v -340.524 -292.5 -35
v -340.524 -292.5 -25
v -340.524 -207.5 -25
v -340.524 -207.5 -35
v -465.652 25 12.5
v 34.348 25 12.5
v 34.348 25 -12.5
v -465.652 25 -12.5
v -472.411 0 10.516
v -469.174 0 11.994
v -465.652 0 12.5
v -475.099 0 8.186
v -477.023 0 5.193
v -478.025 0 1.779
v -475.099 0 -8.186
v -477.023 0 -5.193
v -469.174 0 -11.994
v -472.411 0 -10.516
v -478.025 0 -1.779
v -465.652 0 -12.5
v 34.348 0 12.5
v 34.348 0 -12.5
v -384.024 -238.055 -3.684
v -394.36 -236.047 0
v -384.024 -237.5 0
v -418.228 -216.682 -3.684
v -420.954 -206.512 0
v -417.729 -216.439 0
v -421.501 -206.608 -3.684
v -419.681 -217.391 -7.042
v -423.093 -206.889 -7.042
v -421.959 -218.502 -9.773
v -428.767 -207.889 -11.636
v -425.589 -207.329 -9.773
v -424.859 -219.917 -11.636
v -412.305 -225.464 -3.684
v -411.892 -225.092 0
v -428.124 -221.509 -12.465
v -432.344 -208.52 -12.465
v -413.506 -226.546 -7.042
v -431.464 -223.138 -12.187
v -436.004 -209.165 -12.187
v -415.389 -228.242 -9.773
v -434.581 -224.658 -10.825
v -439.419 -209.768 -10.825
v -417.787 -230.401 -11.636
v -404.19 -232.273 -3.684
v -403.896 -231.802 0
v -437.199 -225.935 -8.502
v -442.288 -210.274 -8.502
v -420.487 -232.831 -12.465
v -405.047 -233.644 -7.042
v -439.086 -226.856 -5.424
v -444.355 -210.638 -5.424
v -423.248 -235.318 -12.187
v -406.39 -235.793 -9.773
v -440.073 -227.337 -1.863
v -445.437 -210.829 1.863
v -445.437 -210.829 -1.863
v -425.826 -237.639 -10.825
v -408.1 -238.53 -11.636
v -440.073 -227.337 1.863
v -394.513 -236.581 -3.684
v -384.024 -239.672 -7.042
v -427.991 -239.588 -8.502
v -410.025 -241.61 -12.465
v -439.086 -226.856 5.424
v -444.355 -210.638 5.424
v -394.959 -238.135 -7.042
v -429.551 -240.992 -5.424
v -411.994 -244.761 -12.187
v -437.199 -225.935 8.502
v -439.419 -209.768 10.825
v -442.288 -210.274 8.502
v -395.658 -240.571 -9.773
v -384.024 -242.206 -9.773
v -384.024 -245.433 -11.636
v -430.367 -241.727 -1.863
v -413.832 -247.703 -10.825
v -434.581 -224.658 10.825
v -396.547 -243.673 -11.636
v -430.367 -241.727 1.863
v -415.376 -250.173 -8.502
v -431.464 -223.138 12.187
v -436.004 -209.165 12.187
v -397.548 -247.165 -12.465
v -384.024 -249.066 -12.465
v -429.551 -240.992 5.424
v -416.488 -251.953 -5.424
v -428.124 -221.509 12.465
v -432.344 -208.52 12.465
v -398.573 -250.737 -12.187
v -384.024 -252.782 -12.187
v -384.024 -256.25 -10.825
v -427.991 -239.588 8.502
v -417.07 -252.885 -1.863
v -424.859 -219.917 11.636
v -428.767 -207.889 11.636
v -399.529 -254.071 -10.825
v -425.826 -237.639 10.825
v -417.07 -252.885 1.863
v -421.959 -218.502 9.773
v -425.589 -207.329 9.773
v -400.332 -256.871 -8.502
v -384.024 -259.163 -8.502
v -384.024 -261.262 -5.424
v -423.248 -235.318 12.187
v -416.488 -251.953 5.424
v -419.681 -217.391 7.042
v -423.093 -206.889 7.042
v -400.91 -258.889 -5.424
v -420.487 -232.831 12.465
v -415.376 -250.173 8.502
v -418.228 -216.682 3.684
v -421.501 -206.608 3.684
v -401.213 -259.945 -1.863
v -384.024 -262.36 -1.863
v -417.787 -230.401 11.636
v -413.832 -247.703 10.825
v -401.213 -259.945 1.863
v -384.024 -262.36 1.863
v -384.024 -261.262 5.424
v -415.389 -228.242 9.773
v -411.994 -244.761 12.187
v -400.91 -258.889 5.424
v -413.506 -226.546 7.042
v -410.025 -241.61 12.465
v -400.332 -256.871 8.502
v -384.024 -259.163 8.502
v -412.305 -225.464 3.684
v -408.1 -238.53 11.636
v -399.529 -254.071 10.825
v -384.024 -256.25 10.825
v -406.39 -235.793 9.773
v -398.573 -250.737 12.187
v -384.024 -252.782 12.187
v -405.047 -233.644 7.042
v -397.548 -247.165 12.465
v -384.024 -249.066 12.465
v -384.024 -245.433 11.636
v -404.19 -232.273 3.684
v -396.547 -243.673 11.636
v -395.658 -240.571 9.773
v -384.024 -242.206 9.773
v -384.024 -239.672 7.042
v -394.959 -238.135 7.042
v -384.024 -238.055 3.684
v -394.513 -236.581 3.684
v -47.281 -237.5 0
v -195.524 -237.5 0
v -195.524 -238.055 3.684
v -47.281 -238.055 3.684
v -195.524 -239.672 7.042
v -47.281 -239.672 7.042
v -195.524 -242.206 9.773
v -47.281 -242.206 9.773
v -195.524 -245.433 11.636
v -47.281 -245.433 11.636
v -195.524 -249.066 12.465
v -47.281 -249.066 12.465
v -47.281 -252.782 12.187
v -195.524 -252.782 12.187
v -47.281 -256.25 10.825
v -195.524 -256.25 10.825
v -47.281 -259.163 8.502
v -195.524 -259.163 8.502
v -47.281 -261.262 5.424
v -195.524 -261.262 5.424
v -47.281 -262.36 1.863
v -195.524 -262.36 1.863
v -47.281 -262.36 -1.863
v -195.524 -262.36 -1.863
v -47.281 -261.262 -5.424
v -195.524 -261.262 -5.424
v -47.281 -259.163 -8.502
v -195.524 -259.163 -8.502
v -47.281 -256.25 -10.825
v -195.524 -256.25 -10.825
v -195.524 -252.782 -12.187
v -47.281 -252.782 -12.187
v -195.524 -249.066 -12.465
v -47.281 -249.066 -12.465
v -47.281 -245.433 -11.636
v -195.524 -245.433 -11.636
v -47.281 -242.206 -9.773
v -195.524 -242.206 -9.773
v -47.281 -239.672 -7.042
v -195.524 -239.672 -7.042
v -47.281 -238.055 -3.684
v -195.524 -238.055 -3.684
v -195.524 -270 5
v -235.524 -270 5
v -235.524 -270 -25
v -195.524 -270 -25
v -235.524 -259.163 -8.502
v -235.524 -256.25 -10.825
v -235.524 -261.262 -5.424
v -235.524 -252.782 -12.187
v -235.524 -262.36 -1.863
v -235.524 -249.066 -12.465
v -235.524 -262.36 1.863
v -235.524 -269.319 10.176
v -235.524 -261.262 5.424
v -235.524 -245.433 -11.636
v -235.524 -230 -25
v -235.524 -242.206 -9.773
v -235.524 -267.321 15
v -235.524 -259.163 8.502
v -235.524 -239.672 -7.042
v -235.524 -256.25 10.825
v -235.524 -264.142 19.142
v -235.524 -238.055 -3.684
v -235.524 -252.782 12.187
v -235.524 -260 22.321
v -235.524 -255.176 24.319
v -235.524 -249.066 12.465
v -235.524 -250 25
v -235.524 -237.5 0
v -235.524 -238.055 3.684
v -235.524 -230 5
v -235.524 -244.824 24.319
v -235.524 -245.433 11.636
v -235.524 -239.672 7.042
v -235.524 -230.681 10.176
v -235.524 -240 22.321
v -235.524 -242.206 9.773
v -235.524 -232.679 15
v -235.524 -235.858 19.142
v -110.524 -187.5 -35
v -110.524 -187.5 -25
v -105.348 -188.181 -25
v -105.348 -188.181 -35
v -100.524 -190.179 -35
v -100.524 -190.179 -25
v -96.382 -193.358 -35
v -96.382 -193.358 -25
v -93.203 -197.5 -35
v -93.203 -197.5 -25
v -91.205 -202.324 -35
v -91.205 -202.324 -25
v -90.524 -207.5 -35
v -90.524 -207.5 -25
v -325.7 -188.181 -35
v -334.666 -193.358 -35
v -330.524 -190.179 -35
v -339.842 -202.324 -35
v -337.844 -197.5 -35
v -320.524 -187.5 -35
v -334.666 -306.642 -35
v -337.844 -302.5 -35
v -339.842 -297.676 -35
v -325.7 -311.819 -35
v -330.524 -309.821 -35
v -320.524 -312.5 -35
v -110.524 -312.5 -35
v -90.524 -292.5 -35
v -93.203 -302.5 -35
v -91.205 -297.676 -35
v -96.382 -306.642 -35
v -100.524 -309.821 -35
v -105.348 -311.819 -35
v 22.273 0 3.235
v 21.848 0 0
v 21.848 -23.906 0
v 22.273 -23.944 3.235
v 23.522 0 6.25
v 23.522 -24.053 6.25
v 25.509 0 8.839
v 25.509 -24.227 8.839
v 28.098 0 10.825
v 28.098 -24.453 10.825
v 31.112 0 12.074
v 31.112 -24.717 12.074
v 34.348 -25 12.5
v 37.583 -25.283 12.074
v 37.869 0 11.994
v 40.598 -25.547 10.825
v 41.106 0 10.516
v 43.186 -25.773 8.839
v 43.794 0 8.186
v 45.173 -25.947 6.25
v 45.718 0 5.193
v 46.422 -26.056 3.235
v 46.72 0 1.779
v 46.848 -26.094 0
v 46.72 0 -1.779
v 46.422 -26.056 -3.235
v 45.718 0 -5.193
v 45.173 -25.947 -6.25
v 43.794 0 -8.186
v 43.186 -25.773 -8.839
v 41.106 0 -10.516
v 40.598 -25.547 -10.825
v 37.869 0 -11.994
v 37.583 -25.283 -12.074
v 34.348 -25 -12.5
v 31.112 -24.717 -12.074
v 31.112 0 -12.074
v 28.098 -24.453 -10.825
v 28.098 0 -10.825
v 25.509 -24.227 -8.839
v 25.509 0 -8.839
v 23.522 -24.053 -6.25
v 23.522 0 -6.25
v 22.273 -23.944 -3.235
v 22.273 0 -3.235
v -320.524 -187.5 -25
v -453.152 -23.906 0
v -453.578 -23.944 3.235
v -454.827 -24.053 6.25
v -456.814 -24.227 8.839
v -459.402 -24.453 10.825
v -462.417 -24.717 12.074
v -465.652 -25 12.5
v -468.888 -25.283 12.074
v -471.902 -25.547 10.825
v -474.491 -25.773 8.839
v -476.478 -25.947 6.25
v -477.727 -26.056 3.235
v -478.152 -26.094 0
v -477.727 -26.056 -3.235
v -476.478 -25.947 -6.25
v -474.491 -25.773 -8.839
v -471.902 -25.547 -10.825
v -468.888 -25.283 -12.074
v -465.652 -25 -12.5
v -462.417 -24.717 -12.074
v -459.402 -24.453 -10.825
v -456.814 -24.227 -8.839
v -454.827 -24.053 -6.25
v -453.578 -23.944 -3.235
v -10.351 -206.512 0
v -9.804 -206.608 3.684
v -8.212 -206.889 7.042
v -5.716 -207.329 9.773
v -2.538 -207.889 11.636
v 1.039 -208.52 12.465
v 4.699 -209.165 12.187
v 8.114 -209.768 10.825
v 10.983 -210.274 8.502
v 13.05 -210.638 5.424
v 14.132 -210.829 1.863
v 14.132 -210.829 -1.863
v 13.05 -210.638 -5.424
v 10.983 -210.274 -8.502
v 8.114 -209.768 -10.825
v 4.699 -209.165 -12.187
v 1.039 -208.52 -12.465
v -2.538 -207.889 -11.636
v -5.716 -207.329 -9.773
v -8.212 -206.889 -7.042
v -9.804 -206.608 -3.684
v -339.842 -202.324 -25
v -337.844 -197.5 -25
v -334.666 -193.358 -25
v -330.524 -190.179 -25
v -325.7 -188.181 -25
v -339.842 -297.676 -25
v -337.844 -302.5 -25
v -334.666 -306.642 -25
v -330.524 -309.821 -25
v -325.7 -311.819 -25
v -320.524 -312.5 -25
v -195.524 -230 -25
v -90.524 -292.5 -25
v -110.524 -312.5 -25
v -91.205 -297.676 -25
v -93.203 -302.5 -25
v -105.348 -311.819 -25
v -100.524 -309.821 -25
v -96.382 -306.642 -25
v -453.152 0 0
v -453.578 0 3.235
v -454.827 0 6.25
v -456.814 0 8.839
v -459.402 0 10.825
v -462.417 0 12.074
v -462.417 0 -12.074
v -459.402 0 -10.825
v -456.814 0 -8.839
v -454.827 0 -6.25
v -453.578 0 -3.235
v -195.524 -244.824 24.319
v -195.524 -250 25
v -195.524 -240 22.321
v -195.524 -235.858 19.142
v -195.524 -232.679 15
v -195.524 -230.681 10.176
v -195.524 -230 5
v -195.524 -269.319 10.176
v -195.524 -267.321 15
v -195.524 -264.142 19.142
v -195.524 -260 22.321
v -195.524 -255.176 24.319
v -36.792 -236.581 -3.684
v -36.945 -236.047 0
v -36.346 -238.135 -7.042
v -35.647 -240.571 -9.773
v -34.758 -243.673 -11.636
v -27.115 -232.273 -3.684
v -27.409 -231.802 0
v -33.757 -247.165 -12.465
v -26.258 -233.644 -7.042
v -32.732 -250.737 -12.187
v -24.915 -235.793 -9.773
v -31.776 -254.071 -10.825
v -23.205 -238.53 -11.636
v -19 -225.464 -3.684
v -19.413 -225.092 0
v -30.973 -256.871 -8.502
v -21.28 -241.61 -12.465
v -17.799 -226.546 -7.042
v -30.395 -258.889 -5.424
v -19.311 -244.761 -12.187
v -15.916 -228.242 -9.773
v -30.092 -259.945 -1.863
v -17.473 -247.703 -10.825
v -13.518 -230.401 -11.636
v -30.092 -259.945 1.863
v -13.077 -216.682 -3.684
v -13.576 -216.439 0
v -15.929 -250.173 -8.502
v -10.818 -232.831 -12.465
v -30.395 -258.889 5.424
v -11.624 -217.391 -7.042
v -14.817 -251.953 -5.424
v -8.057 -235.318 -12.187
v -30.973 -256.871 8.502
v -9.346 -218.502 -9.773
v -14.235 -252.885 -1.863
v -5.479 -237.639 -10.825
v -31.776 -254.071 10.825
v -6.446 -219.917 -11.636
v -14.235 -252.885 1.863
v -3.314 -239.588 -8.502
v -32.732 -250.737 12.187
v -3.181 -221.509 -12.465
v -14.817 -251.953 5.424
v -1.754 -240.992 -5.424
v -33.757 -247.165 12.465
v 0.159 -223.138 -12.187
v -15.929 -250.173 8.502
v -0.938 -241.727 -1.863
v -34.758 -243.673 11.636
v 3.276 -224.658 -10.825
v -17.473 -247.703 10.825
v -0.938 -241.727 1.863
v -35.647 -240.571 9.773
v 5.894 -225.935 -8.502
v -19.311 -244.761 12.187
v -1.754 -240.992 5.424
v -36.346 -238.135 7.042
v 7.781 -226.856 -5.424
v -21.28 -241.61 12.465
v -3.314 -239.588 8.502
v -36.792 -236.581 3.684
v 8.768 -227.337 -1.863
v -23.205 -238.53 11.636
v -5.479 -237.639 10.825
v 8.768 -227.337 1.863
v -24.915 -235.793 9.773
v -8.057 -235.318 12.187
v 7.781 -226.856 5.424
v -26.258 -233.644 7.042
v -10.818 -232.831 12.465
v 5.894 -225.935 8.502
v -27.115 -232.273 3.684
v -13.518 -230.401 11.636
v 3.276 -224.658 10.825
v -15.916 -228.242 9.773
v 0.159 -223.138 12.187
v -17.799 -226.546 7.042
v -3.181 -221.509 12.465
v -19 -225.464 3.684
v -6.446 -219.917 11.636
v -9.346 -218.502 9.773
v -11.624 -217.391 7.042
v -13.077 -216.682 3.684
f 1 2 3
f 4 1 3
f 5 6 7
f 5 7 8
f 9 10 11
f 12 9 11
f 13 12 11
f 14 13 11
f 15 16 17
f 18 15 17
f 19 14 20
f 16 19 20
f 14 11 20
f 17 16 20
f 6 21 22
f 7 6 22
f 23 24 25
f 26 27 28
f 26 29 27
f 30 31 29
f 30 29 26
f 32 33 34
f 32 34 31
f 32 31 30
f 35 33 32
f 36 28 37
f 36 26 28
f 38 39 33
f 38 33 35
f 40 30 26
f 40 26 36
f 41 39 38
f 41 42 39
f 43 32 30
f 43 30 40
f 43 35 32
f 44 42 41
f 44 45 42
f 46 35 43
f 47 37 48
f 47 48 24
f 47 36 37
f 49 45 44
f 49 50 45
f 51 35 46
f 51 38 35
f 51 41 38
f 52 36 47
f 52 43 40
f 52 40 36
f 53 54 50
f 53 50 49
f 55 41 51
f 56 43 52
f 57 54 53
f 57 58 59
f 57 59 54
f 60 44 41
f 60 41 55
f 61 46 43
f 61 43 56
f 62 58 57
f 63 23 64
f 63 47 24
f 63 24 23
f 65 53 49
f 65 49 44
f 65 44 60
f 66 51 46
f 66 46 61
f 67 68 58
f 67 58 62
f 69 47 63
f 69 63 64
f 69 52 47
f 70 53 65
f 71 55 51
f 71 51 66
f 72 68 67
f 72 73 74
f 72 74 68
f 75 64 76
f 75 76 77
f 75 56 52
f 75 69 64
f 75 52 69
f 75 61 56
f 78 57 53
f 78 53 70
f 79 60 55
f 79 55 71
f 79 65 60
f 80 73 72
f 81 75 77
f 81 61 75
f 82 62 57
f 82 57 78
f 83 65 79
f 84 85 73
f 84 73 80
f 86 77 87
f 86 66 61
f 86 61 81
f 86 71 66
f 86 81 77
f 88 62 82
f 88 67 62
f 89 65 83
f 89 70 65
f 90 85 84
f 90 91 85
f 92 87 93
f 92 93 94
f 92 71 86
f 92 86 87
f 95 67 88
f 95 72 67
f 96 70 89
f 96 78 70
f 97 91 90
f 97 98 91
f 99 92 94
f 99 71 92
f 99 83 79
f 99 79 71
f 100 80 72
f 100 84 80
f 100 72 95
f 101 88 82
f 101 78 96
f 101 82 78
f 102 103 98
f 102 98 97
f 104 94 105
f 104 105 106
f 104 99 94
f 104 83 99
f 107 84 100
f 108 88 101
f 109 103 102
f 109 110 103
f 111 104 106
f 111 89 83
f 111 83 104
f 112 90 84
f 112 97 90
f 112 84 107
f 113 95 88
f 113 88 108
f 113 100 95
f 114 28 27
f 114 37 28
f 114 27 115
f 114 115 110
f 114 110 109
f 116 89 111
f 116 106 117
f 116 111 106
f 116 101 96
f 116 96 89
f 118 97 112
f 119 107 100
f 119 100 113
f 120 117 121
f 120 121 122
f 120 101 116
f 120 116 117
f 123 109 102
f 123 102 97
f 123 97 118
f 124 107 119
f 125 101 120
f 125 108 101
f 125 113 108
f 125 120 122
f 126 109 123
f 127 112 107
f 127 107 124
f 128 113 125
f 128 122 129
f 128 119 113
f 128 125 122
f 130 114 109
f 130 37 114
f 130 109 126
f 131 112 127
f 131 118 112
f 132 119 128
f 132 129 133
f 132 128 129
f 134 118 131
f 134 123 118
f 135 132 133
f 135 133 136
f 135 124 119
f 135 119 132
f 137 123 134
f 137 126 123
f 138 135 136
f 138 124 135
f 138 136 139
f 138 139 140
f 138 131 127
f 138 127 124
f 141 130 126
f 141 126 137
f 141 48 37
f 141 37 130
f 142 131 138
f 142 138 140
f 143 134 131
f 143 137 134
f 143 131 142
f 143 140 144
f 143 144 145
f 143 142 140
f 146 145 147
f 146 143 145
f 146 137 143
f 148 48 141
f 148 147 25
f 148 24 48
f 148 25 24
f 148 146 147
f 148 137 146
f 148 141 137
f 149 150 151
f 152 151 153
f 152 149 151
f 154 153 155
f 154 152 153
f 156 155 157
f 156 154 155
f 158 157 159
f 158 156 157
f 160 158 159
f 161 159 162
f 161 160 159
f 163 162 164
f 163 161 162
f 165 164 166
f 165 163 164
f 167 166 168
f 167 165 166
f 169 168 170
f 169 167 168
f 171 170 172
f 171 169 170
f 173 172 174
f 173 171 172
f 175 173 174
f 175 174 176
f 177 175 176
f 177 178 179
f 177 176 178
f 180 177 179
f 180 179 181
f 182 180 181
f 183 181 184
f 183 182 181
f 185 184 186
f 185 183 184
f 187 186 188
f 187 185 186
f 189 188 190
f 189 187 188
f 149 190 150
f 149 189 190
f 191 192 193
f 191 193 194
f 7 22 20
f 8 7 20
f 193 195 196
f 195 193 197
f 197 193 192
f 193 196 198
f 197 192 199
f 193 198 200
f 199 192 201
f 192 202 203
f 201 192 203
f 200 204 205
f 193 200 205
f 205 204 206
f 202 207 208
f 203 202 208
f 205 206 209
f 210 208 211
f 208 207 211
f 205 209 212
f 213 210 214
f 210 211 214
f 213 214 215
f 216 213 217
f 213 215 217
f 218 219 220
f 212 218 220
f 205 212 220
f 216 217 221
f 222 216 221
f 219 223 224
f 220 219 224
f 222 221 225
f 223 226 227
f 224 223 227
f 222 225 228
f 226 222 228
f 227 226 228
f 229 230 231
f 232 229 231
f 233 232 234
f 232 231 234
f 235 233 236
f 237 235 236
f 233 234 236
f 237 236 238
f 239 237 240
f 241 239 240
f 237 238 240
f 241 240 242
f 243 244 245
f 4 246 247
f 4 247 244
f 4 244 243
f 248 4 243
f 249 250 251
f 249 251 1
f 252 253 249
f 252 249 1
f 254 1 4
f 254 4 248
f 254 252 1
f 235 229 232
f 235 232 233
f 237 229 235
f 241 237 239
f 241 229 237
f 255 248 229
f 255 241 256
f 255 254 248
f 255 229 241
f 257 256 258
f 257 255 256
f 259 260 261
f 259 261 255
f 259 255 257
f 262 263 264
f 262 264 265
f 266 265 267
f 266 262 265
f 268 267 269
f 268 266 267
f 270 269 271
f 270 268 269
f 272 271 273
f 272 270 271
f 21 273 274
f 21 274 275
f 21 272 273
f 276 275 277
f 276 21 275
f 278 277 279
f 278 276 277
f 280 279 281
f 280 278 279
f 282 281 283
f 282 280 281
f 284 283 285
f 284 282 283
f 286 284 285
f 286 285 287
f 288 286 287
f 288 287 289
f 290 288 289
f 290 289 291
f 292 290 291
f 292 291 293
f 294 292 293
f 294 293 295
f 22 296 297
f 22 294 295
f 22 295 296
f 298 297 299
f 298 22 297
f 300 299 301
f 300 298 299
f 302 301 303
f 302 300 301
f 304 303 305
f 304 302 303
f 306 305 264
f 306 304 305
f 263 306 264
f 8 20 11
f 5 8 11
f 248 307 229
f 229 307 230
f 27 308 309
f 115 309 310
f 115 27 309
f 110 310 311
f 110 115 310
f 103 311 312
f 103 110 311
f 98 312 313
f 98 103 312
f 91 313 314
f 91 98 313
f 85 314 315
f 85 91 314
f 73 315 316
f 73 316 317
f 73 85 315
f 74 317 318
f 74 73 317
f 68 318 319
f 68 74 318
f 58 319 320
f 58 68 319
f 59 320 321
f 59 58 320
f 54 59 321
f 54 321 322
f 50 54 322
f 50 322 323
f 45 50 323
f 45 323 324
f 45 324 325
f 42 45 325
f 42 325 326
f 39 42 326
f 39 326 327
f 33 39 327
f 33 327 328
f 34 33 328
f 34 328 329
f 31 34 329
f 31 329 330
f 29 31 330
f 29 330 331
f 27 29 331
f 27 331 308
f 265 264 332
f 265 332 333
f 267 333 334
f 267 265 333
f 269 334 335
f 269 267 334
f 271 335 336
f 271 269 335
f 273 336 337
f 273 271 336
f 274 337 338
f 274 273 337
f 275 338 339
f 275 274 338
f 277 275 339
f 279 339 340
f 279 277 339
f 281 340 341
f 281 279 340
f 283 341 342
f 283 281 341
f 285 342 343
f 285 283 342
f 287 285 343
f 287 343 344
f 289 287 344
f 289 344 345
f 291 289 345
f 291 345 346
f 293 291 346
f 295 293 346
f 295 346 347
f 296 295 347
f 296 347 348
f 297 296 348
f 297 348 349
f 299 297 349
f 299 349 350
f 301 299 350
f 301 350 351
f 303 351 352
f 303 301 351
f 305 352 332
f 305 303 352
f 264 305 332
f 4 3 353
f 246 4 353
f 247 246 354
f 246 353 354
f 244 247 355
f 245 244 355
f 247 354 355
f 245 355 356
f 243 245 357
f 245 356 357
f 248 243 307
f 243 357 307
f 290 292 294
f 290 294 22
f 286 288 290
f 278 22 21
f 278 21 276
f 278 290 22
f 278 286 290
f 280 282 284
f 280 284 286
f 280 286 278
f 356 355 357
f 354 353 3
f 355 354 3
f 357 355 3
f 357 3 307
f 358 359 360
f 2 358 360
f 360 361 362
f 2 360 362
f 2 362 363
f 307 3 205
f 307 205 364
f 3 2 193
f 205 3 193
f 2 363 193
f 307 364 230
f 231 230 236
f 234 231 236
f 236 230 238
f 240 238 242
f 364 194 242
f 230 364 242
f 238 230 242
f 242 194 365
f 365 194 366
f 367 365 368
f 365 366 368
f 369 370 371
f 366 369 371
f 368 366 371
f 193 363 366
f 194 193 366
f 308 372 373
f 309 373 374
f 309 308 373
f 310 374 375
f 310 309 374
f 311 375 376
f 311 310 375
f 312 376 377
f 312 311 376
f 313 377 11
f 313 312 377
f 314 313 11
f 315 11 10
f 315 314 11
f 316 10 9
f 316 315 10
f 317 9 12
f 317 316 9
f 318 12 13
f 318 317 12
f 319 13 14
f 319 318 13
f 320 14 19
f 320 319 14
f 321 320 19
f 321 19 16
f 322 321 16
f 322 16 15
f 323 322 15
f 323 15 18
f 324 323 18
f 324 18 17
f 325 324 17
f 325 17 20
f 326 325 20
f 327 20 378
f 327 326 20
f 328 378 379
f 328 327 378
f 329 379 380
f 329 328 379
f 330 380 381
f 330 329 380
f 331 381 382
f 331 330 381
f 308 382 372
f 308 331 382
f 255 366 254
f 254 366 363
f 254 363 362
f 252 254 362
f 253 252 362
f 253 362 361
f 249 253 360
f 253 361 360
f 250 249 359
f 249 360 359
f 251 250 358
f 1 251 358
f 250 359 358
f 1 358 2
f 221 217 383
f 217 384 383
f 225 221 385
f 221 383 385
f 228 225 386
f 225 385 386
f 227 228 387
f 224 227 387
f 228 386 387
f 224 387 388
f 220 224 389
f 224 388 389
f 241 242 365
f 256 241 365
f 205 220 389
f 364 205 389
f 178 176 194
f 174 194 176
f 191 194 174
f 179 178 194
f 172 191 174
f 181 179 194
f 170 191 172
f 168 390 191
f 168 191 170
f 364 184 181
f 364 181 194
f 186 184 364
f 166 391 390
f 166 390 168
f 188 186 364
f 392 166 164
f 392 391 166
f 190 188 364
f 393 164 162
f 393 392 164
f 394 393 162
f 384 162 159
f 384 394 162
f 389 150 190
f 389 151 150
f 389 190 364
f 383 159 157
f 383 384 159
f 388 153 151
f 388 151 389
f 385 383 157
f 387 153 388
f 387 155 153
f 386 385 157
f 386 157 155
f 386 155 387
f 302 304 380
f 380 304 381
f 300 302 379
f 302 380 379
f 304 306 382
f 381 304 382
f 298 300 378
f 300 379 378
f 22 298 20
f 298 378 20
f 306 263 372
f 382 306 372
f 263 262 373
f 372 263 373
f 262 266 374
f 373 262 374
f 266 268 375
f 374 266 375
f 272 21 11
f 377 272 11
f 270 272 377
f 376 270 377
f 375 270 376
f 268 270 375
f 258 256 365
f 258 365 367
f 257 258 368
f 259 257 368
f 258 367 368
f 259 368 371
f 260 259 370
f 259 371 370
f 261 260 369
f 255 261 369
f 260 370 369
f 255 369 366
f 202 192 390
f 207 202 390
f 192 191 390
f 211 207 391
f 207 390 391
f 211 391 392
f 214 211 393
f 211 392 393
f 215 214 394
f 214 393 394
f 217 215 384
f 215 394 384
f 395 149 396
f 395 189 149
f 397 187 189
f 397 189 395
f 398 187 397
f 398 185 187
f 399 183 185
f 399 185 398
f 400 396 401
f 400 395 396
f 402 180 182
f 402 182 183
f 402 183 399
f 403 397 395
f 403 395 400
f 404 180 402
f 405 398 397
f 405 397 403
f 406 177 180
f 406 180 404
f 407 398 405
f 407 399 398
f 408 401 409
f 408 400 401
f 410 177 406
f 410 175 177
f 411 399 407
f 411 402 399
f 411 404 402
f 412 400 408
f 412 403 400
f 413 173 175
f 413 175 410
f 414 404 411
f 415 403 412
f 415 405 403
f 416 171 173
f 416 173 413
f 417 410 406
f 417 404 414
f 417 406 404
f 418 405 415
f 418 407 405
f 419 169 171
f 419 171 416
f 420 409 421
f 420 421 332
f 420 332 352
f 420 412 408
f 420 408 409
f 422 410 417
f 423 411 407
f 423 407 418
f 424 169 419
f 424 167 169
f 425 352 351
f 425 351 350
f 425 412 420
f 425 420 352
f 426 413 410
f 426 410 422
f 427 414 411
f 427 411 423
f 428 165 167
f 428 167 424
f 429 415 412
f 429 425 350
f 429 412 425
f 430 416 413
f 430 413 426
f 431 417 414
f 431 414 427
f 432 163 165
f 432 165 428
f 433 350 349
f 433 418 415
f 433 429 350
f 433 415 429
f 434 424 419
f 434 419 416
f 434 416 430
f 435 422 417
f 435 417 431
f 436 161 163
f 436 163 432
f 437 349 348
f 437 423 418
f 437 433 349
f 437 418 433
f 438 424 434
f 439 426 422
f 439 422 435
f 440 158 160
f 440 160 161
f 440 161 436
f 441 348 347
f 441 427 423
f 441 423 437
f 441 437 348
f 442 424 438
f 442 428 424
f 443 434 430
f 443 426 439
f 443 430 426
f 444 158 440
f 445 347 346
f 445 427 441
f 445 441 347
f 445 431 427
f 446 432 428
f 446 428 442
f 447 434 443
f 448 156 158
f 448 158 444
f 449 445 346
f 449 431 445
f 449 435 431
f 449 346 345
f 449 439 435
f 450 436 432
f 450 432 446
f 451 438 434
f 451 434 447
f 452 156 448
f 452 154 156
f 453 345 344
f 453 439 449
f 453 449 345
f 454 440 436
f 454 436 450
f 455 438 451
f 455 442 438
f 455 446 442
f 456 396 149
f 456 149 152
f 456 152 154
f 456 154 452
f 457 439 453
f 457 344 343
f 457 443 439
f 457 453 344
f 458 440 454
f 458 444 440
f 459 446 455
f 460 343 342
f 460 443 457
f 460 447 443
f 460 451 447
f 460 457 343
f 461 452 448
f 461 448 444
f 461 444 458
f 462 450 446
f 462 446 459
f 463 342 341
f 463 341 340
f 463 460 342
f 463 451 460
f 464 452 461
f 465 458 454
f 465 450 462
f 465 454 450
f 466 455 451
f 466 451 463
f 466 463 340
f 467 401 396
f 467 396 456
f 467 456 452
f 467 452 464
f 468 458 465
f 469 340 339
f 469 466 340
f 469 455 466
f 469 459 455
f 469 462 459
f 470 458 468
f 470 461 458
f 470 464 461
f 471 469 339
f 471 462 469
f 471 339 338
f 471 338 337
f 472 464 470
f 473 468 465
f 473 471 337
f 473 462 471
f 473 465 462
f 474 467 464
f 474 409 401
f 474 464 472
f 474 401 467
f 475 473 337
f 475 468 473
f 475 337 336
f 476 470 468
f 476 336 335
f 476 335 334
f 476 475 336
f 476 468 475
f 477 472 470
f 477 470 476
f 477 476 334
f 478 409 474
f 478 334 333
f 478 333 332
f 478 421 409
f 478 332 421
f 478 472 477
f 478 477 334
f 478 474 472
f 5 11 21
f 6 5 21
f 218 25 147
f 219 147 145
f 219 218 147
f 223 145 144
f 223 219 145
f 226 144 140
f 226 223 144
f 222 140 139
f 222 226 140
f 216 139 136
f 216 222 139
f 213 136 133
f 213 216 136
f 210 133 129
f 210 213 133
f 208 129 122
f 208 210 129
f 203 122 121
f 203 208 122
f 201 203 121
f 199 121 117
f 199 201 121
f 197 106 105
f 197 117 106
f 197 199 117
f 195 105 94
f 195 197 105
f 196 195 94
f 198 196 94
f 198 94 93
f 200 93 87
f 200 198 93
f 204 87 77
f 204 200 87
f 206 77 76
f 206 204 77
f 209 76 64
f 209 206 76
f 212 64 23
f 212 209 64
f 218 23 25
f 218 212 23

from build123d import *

# Parameters (mm, degrees)
F0_R          = 12.5
F4_DEPTH      = 25
F5_W          = 40
F5_H          = 40
F6_DEPTH      = 25
F6_DEPTH_BACK = 25
F7_R          = 19.99999
F9_DEPTH      = 10


# Not quite as in the source:
# - a fillet or chamfer is up to 0.001 mm smaller than in the source, because OpenCascade refuses the exact size


with BuildPart() as f2:
    # F2: sweep along a path in F1
    with BuildLine(Plane.XY) as f2_path:
        Line((-465.6524967789, 0), (-465.6524967789, -25))
        Line((-465.6524967789, -25), (-433.2643322113, -208.6824088833))
        ThreePointArc((-433.2643322113, -208.6824088833), (-416.163325045, -238.3022221559), (-384.0239445606, -250))
        Line((-384.0239445606, -250), (-47.2810489972, -250))
        ThreePointArc((-47.2810489972, -250), (-15.1416685129, -238.3022221559), (1.9593386534, -208.6824088833))
        Line((1.9593386534, -208.6824088833), (34.3475032211, -25))
        Line((34.3475032211, -25), (34.3475032211, 0))
    # F0 (on Front) → F2 (sweep)
    with BuildSketch(Plane.XZ):
        with Locations((-465.6524967789, 0)):
            Circle(F0_R)
    sweep(path=f2_path.line, transition=Transition.RIGHT)

    # F3 (on face) → F4 (join)
    with BuildSketch(Plane(origin=(0, 0, 0), x_dir=(-1, 0, 0), z_dir=(0, 1, 0))):
        with BuildLine():
            Line((465.6524967789, 12.5), (-34.3475032211, 12.5))
            Line((-34.3475032211, 12.5), (-34.3475032211, -12.5))
            Line((-34.3475032211, -12.5), (465.6524967789, -12.5))
            ThreePointArc((465.6524967789, -12.5), (453.1524967789, 0), (465.6524967789, 12.5))
        make_face()
        with BuildLine():
            Line((465.6524967789, -12.5), (465.6524967789, 12.5))
            ThreePointArc((465.6524967789, 12.5), (453.1524967789, 0), (465.6524967789, -12.5))
        make_face()
    extrude(amount=F4_DEPTH)

    # F5 (on Top) → F6 (join, two sides)
    with BuildSketch(Plane.XY) as f6_sk:
        with Locations((-215.5239445606, -250)):
            Rectangle(F5_W, F5_H)
    extrude(amount=F6_DEPTH)
    extrude(f6_sk.sketch, amount=-F6_DEPTH_BACK)

    # F7 (radius 20 in the source; OpenCascade refuses exactly that, so slightly less here)
    f7_edges = [f2.edges().sort_by_distance(p)[0] for p in [
        (-215.523945, -230, 25),
        (-215.523945, -270, 25),
    ]]
    fillet(f7_edges, radius=F7_R)

    # F8 (on face) → F9 (join)
    with BuildSketch(Plane(origin=(0, 0, -25), x_dir=(1, 0, 0), z_dir=(0, 0, -1))):
        with BuildLine():
            Line((-110.5239445606, 312.5), (-320.5239445606, 312.5))
            ThreePointArc((-320.5239445606, 312.5), (-334.6660801844, 306.6421356237), (-340.5239445606, 292.5))
            Line((-340.5239445606, 292.5), (-340.5239445606, 207.5))
            ThreePointArc((-340.5239445606, 207.5), (-334.6660801844, 193.3578643763), (-320.5239445606, 187.5))
            Line((-320.5239445606, 187.5), (-110.5239445606, 187.5))
            ThreePointArc((-110.5239445606, 187.5), (-96.3818089369, 193.3578643763), (-90.5239445606, 207.5))
            Line((-90.5239445606, 207.5), (-90.5239445606, 292.5))
            ThreePointArc((-90.5239445606, 292.5), (-96.3818089369, 306.6421356237), (-110.5239445606, 312.5))
        make_face()
    extrude(amount=F9_DEPTH)


solid = f2.part
